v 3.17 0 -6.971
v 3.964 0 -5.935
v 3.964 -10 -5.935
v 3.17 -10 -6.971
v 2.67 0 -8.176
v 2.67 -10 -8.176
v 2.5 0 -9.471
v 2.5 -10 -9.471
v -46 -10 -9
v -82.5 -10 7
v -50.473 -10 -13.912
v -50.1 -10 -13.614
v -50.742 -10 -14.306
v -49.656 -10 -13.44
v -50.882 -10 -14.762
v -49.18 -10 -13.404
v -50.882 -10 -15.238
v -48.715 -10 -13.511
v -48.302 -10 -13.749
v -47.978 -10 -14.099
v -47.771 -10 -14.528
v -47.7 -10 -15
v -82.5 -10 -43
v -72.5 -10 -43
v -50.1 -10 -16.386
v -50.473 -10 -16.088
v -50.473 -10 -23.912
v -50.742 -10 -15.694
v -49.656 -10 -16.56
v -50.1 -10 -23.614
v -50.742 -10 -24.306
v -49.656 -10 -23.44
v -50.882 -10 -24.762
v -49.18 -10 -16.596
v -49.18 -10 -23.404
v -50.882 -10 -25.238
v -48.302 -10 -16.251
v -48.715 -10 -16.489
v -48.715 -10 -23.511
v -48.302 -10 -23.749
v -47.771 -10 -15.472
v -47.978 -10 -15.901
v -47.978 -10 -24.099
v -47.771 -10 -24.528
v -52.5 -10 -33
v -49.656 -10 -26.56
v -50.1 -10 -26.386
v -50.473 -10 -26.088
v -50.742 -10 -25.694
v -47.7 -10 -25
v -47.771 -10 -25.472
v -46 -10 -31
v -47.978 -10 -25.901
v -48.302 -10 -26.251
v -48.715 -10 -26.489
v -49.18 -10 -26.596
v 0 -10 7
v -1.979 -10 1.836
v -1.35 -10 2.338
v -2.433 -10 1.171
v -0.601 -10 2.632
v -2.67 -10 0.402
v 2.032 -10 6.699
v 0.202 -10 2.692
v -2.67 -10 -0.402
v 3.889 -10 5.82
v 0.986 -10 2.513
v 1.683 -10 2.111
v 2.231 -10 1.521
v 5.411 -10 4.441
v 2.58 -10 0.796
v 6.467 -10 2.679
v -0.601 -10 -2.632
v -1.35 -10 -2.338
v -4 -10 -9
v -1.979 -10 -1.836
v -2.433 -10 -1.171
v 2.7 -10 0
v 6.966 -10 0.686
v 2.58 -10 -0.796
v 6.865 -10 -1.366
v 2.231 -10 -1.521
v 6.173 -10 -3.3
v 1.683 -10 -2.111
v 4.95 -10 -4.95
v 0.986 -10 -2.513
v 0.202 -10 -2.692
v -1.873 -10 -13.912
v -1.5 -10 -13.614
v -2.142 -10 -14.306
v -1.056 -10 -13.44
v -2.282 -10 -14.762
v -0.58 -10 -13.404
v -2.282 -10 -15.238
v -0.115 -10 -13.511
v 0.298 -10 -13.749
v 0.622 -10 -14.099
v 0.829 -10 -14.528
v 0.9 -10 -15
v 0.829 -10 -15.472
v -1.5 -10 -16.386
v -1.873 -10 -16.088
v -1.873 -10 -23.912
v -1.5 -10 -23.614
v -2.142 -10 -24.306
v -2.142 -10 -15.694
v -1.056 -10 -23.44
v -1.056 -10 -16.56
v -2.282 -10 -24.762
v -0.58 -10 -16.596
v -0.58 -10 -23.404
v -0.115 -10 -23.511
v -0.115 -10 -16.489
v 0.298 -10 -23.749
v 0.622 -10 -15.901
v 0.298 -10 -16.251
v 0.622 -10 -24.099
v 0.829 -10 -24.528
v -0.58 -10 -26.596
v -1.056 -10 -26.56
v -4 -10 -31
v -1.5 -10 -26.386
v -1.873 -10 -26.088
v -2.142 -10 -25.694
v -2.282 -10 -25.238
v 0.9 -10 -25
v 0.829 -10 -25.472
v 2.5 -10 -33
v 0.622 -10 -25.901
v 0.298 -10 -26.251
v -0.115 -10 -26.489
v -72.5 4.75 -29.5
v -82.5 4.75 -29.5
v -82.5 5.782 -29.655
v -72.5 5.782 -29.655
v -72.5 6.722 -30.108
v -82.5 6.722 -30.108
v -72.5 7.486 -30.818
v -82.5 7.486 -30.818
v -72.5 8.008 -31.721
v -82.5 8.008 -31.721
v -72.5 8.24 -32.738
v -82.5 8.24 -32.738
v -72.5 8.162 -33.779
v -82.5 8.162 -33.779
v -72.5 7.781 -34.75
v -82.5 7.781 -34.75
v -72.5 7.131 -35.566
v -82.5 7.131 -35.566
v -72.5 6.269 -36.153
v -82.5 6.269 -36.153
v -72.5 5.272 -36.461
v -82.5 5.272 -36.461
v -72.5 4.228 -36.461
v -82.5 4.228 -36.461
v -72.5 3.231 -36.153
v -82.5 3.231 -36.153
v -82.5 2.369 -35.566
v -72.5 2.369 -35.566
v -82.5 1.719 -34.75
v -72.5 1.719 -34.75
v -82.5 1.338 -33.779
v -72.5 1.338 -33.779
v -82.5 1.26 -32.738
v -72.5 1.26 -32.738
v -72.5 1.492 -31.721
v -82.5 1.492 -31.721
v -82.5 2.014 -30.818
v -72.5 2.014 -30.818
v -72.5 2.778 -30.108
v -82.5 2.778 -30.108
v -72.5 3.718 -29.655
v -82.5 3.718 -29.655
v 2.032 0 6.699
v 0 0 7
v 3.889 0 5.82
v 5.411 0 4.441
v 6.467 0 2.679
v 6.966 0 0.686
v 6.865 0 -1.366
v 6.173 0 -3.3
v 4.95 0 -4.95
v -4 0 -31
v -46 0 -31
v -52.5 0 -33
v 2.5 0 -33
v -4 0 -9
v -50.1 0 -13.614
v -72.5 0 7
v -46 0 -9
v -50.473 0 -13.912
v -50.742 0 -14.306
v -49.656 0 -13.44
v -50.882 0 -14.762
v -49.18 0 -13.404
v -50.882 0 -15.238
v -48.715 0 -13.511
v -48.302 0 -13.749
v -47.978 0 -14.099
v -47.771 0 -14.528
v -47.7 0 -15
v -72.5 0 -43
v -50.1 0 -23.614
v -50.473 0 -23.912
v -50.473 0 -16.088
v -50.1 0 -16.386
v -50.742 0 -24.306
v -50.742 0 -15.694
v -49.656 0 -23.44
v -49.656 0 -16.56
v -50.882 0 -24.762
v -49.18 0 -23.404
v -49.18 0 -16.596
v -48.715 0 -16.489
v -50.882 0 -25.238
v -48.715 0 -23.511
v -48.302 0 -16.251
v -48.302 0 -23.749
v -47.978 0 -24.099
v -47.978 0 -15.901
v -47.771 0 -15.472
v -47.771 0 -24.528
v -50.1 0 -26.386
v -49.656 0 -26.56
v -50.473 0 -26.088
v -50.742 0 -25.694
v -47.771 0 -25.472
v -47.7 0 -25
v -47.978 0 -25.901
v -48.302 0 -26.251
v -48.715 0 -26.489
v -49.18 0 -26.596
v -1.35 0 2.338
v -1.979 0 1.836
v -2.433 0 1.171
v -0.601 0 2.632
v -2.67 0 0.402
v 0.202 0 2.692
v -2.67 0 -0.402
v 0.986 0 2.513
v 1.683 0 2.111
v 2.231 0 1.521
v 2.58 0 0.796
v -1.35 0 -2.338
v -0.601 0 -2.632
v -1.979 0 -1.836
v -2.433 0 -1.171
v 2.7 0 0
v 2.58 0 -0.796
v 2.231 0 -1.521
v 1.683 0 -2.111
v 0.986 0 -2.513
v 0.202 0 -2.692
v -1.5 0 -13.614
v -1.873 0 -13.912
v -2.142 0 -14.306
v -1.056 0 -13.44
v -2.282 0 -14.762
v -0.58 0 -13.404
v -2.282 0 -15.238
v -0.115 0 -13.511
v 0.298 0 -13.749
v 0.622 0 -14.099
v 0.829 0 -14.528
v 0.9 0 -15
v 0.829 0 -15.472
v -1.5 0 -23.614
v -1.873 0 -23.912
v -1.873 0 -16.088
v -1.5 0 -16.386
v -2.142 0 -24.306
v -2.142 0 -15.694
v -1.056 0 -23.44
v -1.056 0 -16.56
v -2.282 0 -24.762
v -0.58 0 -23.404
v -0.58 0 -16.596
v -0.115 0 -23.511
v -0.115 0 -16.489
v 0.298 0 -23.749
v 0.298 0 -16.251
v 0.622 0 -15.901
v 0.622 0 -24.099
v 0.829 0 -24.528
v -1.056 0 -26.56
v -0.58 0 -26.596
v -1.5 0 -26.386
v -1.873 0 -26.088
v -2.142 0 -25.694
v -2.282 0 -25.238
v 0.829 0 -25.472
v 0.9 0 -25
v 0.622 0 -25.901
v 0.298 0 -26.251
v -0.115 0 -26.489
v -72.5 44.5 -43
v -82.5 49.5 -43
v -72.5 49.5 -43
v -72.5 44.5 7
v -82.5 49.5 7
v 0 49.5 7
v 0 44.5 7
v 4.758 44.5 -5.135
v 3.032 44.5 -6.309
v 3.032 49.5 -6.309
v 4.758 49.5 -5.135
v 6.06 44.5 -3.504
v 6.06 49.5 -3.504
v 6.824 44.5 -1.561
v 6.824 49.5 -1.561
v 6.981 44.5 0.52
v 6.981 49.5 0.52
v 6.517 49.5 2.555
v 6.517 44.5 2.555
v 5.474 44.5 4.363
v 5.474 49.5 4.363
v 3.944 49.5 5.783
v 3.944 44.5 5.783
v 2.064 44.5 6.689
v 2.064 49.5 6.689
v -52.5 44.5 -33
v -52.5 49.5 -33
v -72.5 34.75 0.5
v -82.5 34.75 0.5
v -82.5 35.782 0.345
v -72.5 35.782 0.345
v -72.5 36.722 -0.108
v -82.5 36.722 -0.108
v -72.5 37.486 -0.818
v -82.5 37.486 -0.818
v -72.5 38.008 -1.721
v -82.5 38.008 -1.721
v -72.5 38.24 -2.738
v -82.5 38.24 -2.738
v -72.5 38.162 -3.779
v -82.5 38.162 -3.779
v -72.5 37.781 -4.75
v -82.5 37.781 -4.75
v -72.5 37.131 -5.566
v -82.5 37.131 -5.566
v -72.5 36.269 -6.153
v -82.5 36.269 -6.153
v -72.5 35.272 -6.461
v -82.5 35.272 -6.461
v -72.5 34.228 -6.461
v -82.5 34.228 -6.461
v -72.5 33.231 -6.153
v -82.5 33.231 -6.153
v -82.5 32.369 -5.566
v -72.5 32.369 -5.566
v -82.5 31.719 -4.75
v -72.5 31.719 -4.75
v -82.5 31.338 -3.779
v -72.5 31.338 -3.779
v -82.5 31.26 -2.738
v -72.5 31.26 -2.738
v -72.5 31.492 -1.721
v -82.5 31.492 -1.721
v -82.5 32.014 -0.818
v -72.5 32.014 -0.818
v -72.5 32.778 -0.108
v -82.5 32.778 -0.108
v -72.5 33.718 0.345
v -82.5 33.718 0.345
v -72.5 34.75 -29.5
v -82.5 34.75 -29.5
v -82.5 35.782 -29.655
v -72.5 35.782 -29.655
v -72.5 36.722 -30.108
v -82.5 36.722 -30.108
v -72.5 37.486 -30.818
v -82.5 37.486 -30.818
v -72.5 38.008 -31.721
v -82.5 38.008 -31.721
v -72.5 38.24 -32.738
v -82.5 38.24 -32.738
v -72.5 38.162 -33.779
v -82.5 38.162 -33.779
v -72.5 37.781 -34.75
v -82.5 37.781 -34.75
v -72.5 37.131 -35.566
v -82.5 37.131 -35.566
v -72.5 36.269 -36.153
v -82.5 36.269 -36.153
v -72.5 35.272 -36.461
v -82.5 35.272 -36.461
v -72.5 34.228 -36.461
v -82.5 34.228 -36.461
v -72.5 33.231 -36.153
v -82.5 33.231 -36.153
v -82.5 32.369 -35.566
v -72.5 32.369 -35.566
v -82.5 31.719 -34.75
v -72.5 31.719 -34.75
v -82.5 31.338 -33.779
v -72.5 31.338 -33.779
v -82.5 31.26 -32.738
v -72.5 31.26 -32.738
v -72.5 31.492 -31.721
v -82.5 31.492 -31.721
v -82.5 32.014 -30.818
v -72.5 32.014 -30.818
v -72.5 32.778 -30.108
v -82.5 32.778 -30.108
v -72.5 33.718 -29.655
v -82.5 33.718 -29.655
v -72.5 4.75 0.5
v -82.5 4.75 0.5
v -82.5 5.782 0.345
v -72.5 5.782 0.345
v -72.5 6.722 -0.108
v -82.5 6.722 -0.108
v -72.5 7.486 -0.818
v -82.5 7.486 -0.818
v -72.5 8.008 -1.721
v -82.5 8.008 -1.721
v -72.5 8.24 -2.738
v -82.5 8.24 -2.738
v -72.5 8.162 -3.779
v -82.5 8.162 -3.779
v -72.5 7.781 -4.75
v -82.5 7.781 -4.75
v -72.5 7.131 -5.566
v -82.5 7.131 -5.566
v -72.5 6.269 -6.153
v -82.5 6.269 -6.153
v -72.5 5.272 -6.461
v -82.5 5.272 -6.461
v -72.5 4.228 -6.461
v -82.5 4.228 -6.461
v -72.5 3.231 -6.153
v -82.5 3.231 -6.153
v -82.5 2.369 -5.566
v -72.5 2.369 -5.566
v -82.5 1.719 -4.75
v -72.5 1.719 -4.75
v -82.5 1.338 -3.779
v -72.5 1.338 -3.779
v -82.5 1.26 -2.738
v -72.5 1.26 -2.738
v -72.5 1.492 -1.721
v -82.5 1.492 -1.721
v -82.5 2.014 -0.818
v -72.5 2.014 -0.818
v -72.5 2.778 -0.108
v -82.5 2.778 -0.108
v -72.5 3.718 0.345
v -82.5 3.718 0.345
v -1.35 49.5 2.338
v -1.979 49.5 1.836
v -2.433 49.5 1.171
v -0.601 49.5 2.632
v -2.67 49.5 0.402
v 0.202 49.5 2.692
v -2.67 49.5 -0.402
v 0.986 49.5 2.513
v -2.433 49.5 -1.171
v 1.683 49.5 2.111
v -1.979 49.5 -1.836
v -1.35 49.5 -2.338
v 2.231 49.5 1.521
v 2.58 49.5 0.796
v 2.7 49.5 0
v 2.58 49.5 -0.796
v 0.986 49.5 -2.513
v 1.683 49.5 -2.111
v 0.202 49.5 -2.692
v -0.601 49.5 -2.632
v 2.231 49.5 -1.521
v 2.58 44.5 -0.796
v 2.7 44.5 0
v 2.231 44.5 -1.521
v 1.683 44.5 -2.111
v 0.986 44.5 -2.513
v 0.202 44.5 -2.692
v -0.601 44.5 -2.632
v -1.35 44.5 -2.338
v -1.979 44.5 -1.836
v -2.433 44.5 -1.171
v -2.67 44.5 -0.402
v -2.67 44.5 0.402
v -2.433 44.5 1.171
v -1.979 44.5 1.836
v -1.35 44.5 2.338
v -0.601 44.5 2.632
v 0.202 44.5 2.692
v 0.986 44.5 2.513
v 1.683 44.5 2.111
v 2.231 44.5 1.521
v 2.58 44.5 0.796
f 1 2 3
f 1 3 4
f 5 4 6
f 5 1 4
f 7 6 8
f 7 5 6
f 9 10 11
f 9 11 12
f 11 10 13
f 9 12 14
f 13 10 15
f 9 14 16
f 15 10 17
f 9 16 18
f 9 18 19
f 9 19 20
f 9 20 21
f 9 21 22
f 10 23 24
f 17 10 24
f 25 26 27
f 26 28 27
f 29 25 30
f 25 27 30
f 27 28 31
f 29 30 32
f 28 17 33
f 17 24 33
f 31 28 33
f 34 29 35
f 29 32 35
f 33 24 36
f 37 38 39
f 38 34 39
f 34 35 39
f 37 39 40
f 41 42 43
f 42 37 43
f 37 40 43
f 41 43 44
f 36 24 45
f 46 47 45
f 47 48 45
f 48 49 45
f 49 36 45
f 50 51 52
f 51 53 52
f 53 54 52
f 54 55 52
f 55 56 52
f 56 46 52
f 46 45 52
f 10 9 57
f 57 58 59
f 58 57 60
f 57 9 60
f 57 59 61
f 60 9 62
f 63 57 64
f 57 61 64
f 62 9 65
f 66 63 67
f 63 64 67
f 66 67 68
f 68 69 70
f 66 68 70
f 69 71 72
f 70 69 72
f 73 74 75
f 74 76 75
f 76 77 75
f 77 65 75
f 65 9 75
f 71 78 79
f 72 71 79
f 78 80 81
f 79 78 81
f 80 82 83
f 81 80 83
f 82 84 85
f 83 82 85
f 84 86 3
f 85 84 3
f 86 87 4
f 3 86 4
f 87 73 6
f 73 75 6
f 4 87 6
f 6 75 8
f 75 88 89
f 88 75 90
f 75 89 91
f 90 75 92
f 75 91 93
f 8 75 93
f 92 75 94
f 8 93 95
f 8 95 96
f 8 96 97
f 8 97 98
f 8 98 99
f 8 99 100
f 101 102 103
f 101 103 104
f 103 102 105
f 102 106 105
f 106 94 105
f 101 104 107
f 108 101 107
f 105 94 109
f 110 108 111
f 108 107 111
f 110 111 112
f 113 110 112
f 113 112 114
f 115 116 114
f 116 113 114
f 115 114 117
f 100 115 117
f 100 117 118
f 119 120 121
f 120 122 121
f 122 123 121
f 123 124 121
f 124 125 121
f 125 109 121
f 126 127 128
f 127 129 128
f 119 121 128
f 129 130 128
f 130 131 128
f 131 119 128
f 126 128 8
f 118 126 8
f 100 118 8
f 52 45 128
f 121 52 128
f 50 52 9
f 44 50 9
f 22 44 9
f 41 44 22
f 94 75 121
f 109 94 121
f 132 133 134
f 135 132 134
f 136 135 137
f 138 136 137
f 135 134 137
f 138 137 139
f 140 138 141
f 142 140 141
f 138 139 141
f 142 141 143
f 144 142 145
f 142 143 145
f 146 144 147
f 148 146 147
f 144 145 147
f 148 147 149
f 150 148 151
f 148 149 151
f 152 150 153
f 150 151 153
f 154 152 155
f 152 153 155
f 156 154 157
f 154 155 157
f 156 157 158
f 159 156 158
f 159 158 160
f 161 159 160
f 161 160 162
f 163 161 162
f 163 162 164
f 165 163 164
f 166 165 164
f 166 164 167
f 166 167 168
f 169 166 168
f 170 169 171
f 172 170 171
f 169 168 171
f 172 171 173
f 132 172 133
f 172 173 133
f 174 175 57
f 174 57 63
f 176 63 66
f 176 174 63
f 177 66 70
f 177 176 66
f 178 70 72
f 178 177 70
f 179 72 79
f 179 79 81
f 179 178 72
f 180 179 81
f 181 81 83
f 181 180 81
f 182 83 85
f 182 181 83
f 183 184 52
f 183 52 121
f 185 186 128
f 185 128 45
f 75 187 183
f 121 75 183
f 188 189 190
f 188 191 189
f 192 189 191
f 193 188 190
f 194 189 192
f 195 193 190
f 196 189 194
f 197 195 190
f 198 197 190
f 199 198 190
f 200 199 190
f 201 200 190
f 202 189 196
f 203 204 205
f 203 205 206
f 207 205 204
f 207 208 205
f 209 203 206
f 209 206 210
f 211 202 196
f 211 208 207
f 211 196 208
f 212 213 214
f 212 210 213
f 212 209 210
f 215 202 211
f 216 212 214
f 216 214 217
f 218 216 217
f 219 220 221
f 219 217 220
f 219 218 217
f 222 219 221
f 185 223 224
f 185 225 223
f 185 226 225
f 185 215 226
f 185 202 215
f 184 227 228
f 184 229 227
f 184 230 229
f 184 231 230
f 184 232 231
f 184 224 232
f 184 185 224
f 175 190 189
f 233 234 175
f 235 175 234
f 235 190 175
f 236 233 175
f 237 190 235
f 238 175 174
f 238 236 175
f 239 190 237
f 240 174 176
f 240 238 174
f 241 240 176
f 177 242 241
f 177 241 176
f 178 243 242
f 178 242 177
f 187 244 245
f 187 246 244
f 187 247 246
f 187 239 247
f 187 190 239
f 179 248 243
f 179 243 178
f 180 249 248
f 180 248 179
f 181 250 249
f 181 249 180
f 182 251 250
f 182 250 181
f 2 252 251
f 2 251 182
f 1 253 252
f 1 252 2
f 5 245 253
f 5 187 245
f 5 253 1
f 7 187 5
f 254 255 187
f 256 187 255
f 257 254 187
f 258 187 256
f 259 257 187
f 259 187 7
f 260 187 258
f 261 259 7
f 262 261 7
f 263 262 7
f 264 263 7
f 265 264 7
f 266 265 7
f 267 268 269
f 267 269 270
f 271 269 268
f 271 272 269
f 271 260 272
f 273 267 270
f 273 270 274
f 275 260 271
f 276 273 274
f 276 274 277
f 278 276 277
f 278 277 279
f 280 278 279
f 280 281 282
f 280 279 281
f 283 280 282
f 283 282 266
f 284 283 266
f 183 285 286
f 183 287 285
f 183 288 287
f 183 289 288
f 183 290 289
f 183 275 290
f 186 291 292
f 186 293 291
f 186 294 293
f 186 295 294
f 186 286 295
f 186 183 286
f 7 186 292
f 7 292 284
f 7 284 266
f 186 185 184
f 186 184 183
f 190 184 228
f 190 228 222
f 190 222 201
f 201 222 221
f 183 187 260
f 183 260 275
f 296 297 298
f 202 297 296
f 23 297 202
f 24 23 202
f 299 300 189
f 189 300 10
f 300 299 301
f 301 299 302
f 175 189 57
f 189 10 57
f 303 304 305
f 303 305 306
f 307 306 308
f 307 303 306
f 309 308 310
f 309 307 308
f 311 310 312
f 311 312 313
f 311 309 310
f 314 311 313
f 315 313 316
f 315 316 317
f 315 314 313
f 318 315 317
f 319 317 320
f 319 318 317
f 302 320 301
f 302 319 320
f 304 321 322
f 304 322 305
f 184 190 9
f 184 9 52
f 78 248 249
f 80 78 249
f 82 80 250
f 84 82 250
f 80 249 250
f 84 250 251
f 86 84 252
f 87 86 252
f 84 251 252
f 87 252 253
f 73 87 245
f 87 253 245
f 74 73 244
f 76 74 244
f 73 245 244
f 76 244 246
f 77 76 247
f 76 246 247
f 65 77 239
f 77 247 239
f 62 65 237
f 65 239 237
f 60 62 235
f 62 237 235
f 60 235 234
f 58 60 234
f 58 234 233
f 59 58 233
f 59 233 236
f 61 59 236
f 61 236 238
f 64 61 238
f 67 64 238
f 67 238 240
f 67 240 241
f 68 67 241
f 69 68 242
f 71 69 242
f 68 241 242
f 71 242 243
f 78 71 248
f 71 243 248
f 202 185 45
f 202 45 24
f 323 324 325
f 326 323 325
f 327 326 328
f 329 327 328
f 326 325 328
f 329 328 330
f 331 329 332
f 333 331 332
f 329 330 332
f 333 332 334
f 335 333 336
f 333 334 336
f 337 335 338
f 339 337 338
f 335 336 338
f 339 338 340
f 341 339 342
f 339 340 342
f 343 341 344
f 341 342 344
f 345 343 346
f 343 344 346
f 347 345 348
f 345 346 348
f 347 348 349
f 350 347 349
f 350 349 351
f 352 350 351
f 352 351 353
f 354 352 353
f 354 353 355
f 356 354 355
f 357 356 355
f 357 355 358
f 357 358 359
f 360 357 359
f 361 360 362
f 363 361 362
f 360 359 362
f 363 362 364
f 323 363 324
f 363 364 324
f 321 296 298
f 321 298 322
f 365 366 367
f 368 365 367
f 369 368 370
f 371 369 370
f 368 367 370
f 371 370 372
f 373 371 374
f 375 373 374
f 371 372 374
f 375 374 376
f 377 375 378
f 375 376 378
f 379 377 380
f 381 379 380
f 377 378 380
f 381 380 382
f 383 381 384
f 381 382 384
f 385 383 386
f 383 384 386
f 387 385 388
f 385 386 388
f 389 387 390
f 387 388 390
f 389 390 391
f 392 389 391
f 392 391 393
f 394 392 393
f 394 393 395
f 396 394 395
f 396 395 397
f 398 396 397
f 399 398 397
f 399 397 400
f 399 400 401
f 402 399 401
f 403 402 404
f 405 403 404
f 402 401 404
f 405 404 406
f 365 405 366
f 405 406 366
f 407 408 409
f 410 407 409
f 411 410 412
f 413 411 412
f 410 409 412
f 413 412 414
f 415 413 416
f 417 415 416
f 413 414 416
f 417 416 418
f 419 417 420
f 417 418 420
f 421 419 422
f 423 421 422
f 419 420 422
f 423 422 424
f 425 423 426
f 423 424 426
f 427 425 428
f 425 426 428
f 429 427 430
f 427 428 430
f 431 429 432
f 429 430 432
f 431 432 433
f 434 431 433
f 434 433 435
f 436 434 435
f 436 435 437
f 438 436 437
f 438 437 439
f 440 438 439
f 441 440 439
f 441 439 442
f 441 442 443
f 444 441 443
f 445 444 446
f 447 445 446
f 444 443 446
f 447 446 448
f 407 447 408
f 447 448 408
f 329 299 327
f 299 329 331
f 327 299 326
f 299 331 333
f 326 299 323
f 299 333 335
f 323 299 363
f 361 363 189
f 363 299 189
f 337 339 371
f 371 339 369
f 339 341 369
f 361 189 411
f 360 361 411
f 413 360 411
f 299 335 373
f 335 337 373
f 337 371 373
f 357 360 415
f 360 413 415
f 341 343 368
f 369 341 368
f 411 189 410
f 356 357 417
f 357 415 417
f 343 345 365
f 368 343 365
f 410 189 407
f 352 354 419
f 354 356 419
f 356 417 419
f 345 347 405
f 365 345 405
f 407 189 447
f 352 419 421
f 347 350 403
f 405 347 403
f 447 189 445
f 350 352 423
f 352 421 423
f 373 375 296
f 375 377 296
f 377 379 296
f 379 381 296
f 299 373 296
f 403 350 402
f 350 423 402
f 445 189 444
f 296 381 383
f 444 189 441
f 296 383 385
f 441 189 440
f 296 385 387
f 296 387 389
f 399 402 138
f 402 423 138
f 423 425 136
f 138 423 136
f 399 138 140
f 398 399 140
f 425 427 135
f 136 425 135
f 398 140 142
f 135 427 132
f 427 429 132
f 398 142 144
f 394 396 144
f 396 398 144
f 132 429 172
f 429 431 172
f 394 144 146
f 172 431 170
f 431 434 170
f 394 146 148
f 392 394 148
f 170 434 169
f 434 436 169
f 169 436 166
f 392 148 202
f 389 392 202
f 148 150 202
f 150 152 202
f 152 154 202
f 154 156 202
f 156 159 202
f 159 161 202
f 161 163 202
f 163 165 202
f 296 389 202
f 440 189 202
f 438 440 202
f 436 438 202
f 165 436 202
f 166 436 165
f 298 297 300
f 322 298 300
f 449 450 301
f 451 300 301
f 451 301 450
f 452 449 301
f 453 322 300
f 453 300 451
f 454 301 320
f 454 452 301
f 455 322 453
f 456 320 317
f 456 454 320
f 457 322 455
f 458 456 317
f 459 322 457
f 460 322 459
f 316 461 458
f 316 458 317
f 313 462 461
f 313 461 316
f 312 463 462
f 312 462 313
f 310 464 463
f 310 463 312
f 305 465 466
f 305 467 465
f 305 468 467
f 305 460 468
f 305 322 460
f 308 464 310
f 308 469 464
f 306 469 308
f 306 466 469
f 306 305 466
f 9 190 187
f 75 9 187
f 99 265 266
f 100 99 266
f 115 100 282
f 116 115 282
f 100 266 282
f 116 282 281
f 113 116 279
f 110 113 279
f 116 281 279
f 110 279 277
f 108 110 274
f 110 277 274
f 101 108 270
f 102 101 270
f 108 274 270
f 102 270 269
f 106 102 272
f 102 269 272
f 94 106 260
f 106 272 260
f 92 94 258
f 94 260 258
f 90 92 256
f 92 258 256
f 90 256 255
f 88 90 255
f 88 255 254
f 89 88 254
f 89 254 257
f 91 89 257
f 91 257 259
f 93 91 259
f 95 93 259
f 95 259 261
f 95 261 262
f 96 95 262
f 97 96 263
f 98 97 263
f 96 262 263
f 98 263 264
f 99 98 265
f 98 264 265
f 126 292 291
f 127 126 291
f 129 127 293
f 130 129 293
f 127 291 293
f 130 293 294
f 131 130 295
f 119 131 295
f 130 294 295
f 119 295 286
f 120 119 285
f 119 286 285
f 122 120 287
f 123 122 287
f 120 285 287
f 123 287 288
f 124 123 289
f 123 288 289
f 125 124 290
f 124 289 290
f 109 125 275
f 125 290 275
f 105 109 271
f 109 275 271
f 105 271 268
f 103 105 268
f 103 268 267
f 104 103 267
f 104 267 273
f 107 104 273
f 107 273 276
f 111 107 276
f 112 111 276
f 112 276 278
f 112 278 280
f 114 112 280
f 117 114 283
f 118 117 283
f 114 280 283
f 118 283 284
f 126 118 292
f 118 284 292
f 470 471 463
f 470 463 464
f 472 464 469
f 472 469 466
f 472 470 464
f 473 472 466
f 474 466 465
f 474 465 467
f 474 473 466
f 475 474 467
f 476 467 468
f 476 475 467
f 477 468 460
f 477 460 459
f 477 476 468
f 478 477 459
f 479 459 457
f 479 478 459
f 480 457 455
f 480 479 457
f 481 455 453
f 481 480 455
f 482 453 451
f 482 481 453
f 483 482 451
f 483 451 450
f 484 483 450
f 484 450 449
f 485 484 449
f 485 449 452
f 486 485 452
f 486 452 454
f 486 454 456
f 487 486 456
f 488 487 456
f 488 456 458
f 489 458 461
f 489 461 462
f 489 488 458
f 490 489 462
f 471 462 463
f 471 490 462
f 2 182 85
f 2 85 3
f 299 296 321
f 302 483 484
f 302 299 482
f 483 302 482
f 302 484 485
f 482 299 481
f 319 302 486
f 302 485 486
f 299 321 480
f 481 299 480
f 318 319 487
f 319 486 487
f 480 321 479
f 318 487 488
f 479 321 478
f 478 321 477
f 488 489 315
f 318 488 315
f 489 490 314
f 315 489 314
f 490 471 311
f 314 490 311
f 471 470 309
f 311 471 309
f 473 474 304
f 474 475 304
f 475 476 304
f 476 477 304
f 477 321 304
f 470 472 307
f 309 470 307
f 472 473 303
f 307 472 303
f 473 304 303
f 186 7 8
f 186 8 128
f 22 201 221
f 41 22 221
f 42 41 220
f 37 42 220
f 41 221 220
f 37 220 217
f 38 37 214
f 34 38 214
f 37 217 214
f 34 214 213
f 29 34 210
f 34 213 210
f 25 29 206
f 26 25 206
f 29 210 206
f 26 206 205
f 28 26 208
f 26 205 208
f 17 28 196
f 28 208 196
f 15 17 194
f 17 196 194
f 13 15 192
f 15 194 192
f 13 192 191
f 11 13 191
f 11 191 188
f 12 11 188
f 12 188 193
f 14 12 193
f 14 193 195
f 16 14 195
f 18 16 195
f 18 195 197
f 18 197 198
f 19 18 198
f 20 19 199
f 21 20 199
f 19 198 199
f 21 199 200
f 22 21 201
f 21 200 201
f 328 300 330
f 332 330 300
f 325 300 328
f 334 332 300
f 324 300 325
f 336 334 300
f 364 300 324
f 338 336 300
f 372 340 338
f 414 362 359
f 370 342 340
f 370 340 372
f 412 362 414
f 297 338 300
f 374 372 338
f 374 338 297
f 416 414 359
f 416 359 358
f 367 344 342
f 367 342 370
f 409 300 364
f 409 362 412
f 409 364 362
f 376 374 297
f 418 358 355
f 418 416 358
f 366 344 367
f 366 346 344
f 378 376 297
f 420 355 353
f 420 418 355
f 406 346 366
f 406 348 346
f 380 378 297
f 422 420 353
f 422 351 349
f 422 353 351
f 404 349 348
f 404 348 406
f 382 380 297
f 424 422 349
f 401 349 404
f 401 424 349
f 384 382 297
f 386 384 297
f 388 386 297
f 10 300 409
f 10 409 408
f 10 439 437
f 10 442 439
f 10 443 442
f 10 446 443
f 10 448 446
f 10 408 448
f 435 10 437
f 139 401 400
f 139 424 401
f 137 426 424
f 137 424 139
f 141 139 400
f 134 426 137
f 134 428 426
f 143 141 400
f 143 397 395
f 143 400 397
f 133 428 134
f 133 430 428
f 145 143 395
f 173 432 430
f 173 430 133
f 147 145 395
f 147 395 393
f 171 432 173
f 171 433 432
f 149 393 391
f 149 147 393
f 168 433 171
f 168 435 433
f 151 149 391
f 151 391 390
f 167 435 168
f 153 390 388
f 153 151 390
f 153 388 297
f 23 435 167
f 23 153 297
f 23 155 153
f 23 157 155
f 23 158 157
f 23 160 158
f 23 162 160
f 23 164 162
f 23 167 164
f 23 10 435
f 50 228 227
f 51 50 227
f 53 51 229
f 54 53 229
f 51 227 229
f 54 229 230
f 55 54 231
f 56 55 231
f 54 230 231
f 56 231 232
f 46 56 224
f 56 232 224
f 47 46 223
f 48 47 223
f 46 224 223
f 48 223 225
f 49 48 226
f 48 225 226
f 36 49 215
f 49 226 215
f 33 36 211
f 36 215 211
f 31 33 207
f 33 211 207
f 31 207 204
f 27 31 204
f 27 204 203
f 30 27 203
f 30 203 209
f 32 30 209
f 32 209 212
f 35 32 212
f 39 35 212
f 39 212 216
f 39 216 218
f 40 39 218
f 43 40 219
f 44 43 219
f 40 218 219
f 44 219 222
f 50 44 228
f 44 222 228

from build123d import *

# Parameters (mm, degrees)
SKETCH1_R           = 1.6
SKETCH1_R_2         = 5
SKETCH1_W           = 42
SKETCH1_H           = 22
BOSS_EXTRUDE1_DEPTH = 10
BOSS_EXTRUDE2_DEPTH = 10
BOSS_EXTRUDE4_START = 44.5
SKETCH2_R           = 5
BOSS_EXTRUDE4_DEPTH = 5
BOSS_EXTRUDE3_START = -10
SKETCH1_5_W         = 10
SKETCH1_5_H         = 50
BOSS_EXTRUDE3_DEPTH = 54.5
SKETCH3_R           = 3.5
CUT_EXTRUDE1_DEPTH  = 10
SKETCH4_R           = 5
SKETCH4_R_2         = 2.7
BOSS_EXTRUDE5_DEPTH = 10
BOSS_EXTRUDE6_START = 44.5
SKETCH4_2_R         = 5
SKETCH4_2_R_2       = 2.7
BOSS_EXTRUDE6_DEPTH = 5


with BuildPart() as part:
    # Sketch1 → Boss-Extrude1 (new body)
    with BuildSketch(Plane(origin=(0, 0, 0), x_dir=(1, 0, 0), z_dir=(0, 1, 0))):
        with BuildLine():
            Line((4.949747468, 4.949747468), (3.964466094, 5.935028843))
            ThreePointArc((3.964466094, 5.935028843), (2.880602337, 7.557145587), (2.5, 9.470562748))
            Line((2.5, 9.470562748), (2.5, 33))
            Line((2.5, 33), (-52.5, 33))
            Line((-52.5, 33), (-52.5, -7))
            Line((-52.5, -7), (0, -7))
            ThreePointArc((0, -7), (6.467156728, -2.678784027), (4.949747468, 4.949747468))
        make_face()
        with Locations((-49.3, 25)):
            Circle(SKETCH1_R, mode=Mode.SUBTRACT)
        with Locations((-49.3, 15)):
            Circle(SKETCH1_R, mode=Mode.SUBTRACT)
        with Locations((-0.7, 15)):
            Circle(SKETCH1_R, mode=Mode.SUBTRACT)
        with Locations((-0.7, 25)):
            Circle(SKETCH1_R, mode=Mode.SUBTRACT)
        Circle(SKETCH1_R_2, mode=Mode.SUBTRACT)
        with Locations((-25, 20)):
            Rectangle(SKETCH1_W, SKETCH1_H, mode=Mode.SUBTRACT)
    extrude(amount=-BOSS_EXTRUDE1_DEPTH)

    # Sketch1<4> → Boss-Extrude2 (add)
    with BuildSketch(Plane(origin=(0, 0, 0), x_dir=(1, 0, 0), z_dir=(0, 1, 0))):
        Polygon((-72.5, -7), (-52.5, -7), (-52.5, 33), (-72.5, 43), align=None)
    extrude(amount=-BOSS_EXTRUDE2_DEPTH)



with BuildPart() as body_2:
    # Sketch2 → Boss-Extrude4 (new body)
    with BuildSketch(Plane(origin=(0, 0, 0), x_dir=(1, 0, 0), z_dir=(0, 1, 0)).offset(BOSS_EXTRUDE4_START)):
        with BuildLine():
            Line((-72.5, 43), (-52.5, 33))
            Line((-52.5, 33), (3.032382393, 6.309093201))
            ThreePointArc((3.032382393, 6.309093201), (6.825088, -1.555047844), (0, -7))
            Line((0, -7), (-52.5, -7))
            Line((-52.5, -7), (-82.5, -7))
            Line((-82.5, -7), (-82.5, 43))
            Line((-82.5, 43), (-72.5, 43))
        make_face()
        Circle(SKETCH2_R, mode=Mode.SUBTRACT)
    extrude(amount=BOSS_EXTRUDE4_DEPTH)


with BuildPart() as part_1:
    add(part.part)

    add(body_2.part)  # Boss-Extrude3 merges body 2
    # Sketch1<5> → Boss-Extrude3 (add)
    with BuildSketch(Plane(origin=(0, 0, 0), x_dir=(1, 0, 0), z_dir=(0, 1, 0)).offset(BOSS_EXTRUDE3_START)):
        with Locations((-77.5, 18)):
            Rectangle(SKETCH1_5_W, SKETCH1_5_H)
    extrude(amount=BOSS_EXTRUDE3_DEPTH)

    # Sketch3 → Cut-Extrude1 (cut)
    with BuildSketch(Plane.ZY.offset(82.5)):
        with Locations((-3, 34.75)):
            Circle(SKETCH3_R)
        with Locations((-3, 4.75)):
            Circle(SKETCH3_R)
        with Locations((-33, 4.75)):
            Circle(SKETCH3_R)
        with Locations((-33, 34.75)):
            Circle(SKETCH3_R)
    extrude(amount=-CUT_EXTRUDE1_DEPTH, mode=Mode.SUBTRACT)

    # Sketch4 → Boss-Extrude5 (add)
    with BuildSketch(Plane(origin=(0, 0, 0), x_dir=(1, 0, 0), z_dir=(0, 1, 0))):
        Circle(SKETCH4_R)
        Circle(SKETCH4_R_2, mode=Mode.SUBTRACT)
    extrude(amount=-BOSS_EXTRUDE5_DEPTH)

    # Sketch4<2> → Boss-Extrude6 (add)
    with BuildSketch(Plane(origin=(0, 0, 0), x_dir=(1, 0, 0), z_dir=(0, 1, 0)).offset(BOSS_EXTRUDE6_START)):
        Circle(SKETCH4_2_R)
        Circle(SKETCH4_2_R_2, mode=Mode.SUBTRACT)
    extrude(amount=BOSS_EXTRUDE6_DEPTH)


solid = part_1.part
